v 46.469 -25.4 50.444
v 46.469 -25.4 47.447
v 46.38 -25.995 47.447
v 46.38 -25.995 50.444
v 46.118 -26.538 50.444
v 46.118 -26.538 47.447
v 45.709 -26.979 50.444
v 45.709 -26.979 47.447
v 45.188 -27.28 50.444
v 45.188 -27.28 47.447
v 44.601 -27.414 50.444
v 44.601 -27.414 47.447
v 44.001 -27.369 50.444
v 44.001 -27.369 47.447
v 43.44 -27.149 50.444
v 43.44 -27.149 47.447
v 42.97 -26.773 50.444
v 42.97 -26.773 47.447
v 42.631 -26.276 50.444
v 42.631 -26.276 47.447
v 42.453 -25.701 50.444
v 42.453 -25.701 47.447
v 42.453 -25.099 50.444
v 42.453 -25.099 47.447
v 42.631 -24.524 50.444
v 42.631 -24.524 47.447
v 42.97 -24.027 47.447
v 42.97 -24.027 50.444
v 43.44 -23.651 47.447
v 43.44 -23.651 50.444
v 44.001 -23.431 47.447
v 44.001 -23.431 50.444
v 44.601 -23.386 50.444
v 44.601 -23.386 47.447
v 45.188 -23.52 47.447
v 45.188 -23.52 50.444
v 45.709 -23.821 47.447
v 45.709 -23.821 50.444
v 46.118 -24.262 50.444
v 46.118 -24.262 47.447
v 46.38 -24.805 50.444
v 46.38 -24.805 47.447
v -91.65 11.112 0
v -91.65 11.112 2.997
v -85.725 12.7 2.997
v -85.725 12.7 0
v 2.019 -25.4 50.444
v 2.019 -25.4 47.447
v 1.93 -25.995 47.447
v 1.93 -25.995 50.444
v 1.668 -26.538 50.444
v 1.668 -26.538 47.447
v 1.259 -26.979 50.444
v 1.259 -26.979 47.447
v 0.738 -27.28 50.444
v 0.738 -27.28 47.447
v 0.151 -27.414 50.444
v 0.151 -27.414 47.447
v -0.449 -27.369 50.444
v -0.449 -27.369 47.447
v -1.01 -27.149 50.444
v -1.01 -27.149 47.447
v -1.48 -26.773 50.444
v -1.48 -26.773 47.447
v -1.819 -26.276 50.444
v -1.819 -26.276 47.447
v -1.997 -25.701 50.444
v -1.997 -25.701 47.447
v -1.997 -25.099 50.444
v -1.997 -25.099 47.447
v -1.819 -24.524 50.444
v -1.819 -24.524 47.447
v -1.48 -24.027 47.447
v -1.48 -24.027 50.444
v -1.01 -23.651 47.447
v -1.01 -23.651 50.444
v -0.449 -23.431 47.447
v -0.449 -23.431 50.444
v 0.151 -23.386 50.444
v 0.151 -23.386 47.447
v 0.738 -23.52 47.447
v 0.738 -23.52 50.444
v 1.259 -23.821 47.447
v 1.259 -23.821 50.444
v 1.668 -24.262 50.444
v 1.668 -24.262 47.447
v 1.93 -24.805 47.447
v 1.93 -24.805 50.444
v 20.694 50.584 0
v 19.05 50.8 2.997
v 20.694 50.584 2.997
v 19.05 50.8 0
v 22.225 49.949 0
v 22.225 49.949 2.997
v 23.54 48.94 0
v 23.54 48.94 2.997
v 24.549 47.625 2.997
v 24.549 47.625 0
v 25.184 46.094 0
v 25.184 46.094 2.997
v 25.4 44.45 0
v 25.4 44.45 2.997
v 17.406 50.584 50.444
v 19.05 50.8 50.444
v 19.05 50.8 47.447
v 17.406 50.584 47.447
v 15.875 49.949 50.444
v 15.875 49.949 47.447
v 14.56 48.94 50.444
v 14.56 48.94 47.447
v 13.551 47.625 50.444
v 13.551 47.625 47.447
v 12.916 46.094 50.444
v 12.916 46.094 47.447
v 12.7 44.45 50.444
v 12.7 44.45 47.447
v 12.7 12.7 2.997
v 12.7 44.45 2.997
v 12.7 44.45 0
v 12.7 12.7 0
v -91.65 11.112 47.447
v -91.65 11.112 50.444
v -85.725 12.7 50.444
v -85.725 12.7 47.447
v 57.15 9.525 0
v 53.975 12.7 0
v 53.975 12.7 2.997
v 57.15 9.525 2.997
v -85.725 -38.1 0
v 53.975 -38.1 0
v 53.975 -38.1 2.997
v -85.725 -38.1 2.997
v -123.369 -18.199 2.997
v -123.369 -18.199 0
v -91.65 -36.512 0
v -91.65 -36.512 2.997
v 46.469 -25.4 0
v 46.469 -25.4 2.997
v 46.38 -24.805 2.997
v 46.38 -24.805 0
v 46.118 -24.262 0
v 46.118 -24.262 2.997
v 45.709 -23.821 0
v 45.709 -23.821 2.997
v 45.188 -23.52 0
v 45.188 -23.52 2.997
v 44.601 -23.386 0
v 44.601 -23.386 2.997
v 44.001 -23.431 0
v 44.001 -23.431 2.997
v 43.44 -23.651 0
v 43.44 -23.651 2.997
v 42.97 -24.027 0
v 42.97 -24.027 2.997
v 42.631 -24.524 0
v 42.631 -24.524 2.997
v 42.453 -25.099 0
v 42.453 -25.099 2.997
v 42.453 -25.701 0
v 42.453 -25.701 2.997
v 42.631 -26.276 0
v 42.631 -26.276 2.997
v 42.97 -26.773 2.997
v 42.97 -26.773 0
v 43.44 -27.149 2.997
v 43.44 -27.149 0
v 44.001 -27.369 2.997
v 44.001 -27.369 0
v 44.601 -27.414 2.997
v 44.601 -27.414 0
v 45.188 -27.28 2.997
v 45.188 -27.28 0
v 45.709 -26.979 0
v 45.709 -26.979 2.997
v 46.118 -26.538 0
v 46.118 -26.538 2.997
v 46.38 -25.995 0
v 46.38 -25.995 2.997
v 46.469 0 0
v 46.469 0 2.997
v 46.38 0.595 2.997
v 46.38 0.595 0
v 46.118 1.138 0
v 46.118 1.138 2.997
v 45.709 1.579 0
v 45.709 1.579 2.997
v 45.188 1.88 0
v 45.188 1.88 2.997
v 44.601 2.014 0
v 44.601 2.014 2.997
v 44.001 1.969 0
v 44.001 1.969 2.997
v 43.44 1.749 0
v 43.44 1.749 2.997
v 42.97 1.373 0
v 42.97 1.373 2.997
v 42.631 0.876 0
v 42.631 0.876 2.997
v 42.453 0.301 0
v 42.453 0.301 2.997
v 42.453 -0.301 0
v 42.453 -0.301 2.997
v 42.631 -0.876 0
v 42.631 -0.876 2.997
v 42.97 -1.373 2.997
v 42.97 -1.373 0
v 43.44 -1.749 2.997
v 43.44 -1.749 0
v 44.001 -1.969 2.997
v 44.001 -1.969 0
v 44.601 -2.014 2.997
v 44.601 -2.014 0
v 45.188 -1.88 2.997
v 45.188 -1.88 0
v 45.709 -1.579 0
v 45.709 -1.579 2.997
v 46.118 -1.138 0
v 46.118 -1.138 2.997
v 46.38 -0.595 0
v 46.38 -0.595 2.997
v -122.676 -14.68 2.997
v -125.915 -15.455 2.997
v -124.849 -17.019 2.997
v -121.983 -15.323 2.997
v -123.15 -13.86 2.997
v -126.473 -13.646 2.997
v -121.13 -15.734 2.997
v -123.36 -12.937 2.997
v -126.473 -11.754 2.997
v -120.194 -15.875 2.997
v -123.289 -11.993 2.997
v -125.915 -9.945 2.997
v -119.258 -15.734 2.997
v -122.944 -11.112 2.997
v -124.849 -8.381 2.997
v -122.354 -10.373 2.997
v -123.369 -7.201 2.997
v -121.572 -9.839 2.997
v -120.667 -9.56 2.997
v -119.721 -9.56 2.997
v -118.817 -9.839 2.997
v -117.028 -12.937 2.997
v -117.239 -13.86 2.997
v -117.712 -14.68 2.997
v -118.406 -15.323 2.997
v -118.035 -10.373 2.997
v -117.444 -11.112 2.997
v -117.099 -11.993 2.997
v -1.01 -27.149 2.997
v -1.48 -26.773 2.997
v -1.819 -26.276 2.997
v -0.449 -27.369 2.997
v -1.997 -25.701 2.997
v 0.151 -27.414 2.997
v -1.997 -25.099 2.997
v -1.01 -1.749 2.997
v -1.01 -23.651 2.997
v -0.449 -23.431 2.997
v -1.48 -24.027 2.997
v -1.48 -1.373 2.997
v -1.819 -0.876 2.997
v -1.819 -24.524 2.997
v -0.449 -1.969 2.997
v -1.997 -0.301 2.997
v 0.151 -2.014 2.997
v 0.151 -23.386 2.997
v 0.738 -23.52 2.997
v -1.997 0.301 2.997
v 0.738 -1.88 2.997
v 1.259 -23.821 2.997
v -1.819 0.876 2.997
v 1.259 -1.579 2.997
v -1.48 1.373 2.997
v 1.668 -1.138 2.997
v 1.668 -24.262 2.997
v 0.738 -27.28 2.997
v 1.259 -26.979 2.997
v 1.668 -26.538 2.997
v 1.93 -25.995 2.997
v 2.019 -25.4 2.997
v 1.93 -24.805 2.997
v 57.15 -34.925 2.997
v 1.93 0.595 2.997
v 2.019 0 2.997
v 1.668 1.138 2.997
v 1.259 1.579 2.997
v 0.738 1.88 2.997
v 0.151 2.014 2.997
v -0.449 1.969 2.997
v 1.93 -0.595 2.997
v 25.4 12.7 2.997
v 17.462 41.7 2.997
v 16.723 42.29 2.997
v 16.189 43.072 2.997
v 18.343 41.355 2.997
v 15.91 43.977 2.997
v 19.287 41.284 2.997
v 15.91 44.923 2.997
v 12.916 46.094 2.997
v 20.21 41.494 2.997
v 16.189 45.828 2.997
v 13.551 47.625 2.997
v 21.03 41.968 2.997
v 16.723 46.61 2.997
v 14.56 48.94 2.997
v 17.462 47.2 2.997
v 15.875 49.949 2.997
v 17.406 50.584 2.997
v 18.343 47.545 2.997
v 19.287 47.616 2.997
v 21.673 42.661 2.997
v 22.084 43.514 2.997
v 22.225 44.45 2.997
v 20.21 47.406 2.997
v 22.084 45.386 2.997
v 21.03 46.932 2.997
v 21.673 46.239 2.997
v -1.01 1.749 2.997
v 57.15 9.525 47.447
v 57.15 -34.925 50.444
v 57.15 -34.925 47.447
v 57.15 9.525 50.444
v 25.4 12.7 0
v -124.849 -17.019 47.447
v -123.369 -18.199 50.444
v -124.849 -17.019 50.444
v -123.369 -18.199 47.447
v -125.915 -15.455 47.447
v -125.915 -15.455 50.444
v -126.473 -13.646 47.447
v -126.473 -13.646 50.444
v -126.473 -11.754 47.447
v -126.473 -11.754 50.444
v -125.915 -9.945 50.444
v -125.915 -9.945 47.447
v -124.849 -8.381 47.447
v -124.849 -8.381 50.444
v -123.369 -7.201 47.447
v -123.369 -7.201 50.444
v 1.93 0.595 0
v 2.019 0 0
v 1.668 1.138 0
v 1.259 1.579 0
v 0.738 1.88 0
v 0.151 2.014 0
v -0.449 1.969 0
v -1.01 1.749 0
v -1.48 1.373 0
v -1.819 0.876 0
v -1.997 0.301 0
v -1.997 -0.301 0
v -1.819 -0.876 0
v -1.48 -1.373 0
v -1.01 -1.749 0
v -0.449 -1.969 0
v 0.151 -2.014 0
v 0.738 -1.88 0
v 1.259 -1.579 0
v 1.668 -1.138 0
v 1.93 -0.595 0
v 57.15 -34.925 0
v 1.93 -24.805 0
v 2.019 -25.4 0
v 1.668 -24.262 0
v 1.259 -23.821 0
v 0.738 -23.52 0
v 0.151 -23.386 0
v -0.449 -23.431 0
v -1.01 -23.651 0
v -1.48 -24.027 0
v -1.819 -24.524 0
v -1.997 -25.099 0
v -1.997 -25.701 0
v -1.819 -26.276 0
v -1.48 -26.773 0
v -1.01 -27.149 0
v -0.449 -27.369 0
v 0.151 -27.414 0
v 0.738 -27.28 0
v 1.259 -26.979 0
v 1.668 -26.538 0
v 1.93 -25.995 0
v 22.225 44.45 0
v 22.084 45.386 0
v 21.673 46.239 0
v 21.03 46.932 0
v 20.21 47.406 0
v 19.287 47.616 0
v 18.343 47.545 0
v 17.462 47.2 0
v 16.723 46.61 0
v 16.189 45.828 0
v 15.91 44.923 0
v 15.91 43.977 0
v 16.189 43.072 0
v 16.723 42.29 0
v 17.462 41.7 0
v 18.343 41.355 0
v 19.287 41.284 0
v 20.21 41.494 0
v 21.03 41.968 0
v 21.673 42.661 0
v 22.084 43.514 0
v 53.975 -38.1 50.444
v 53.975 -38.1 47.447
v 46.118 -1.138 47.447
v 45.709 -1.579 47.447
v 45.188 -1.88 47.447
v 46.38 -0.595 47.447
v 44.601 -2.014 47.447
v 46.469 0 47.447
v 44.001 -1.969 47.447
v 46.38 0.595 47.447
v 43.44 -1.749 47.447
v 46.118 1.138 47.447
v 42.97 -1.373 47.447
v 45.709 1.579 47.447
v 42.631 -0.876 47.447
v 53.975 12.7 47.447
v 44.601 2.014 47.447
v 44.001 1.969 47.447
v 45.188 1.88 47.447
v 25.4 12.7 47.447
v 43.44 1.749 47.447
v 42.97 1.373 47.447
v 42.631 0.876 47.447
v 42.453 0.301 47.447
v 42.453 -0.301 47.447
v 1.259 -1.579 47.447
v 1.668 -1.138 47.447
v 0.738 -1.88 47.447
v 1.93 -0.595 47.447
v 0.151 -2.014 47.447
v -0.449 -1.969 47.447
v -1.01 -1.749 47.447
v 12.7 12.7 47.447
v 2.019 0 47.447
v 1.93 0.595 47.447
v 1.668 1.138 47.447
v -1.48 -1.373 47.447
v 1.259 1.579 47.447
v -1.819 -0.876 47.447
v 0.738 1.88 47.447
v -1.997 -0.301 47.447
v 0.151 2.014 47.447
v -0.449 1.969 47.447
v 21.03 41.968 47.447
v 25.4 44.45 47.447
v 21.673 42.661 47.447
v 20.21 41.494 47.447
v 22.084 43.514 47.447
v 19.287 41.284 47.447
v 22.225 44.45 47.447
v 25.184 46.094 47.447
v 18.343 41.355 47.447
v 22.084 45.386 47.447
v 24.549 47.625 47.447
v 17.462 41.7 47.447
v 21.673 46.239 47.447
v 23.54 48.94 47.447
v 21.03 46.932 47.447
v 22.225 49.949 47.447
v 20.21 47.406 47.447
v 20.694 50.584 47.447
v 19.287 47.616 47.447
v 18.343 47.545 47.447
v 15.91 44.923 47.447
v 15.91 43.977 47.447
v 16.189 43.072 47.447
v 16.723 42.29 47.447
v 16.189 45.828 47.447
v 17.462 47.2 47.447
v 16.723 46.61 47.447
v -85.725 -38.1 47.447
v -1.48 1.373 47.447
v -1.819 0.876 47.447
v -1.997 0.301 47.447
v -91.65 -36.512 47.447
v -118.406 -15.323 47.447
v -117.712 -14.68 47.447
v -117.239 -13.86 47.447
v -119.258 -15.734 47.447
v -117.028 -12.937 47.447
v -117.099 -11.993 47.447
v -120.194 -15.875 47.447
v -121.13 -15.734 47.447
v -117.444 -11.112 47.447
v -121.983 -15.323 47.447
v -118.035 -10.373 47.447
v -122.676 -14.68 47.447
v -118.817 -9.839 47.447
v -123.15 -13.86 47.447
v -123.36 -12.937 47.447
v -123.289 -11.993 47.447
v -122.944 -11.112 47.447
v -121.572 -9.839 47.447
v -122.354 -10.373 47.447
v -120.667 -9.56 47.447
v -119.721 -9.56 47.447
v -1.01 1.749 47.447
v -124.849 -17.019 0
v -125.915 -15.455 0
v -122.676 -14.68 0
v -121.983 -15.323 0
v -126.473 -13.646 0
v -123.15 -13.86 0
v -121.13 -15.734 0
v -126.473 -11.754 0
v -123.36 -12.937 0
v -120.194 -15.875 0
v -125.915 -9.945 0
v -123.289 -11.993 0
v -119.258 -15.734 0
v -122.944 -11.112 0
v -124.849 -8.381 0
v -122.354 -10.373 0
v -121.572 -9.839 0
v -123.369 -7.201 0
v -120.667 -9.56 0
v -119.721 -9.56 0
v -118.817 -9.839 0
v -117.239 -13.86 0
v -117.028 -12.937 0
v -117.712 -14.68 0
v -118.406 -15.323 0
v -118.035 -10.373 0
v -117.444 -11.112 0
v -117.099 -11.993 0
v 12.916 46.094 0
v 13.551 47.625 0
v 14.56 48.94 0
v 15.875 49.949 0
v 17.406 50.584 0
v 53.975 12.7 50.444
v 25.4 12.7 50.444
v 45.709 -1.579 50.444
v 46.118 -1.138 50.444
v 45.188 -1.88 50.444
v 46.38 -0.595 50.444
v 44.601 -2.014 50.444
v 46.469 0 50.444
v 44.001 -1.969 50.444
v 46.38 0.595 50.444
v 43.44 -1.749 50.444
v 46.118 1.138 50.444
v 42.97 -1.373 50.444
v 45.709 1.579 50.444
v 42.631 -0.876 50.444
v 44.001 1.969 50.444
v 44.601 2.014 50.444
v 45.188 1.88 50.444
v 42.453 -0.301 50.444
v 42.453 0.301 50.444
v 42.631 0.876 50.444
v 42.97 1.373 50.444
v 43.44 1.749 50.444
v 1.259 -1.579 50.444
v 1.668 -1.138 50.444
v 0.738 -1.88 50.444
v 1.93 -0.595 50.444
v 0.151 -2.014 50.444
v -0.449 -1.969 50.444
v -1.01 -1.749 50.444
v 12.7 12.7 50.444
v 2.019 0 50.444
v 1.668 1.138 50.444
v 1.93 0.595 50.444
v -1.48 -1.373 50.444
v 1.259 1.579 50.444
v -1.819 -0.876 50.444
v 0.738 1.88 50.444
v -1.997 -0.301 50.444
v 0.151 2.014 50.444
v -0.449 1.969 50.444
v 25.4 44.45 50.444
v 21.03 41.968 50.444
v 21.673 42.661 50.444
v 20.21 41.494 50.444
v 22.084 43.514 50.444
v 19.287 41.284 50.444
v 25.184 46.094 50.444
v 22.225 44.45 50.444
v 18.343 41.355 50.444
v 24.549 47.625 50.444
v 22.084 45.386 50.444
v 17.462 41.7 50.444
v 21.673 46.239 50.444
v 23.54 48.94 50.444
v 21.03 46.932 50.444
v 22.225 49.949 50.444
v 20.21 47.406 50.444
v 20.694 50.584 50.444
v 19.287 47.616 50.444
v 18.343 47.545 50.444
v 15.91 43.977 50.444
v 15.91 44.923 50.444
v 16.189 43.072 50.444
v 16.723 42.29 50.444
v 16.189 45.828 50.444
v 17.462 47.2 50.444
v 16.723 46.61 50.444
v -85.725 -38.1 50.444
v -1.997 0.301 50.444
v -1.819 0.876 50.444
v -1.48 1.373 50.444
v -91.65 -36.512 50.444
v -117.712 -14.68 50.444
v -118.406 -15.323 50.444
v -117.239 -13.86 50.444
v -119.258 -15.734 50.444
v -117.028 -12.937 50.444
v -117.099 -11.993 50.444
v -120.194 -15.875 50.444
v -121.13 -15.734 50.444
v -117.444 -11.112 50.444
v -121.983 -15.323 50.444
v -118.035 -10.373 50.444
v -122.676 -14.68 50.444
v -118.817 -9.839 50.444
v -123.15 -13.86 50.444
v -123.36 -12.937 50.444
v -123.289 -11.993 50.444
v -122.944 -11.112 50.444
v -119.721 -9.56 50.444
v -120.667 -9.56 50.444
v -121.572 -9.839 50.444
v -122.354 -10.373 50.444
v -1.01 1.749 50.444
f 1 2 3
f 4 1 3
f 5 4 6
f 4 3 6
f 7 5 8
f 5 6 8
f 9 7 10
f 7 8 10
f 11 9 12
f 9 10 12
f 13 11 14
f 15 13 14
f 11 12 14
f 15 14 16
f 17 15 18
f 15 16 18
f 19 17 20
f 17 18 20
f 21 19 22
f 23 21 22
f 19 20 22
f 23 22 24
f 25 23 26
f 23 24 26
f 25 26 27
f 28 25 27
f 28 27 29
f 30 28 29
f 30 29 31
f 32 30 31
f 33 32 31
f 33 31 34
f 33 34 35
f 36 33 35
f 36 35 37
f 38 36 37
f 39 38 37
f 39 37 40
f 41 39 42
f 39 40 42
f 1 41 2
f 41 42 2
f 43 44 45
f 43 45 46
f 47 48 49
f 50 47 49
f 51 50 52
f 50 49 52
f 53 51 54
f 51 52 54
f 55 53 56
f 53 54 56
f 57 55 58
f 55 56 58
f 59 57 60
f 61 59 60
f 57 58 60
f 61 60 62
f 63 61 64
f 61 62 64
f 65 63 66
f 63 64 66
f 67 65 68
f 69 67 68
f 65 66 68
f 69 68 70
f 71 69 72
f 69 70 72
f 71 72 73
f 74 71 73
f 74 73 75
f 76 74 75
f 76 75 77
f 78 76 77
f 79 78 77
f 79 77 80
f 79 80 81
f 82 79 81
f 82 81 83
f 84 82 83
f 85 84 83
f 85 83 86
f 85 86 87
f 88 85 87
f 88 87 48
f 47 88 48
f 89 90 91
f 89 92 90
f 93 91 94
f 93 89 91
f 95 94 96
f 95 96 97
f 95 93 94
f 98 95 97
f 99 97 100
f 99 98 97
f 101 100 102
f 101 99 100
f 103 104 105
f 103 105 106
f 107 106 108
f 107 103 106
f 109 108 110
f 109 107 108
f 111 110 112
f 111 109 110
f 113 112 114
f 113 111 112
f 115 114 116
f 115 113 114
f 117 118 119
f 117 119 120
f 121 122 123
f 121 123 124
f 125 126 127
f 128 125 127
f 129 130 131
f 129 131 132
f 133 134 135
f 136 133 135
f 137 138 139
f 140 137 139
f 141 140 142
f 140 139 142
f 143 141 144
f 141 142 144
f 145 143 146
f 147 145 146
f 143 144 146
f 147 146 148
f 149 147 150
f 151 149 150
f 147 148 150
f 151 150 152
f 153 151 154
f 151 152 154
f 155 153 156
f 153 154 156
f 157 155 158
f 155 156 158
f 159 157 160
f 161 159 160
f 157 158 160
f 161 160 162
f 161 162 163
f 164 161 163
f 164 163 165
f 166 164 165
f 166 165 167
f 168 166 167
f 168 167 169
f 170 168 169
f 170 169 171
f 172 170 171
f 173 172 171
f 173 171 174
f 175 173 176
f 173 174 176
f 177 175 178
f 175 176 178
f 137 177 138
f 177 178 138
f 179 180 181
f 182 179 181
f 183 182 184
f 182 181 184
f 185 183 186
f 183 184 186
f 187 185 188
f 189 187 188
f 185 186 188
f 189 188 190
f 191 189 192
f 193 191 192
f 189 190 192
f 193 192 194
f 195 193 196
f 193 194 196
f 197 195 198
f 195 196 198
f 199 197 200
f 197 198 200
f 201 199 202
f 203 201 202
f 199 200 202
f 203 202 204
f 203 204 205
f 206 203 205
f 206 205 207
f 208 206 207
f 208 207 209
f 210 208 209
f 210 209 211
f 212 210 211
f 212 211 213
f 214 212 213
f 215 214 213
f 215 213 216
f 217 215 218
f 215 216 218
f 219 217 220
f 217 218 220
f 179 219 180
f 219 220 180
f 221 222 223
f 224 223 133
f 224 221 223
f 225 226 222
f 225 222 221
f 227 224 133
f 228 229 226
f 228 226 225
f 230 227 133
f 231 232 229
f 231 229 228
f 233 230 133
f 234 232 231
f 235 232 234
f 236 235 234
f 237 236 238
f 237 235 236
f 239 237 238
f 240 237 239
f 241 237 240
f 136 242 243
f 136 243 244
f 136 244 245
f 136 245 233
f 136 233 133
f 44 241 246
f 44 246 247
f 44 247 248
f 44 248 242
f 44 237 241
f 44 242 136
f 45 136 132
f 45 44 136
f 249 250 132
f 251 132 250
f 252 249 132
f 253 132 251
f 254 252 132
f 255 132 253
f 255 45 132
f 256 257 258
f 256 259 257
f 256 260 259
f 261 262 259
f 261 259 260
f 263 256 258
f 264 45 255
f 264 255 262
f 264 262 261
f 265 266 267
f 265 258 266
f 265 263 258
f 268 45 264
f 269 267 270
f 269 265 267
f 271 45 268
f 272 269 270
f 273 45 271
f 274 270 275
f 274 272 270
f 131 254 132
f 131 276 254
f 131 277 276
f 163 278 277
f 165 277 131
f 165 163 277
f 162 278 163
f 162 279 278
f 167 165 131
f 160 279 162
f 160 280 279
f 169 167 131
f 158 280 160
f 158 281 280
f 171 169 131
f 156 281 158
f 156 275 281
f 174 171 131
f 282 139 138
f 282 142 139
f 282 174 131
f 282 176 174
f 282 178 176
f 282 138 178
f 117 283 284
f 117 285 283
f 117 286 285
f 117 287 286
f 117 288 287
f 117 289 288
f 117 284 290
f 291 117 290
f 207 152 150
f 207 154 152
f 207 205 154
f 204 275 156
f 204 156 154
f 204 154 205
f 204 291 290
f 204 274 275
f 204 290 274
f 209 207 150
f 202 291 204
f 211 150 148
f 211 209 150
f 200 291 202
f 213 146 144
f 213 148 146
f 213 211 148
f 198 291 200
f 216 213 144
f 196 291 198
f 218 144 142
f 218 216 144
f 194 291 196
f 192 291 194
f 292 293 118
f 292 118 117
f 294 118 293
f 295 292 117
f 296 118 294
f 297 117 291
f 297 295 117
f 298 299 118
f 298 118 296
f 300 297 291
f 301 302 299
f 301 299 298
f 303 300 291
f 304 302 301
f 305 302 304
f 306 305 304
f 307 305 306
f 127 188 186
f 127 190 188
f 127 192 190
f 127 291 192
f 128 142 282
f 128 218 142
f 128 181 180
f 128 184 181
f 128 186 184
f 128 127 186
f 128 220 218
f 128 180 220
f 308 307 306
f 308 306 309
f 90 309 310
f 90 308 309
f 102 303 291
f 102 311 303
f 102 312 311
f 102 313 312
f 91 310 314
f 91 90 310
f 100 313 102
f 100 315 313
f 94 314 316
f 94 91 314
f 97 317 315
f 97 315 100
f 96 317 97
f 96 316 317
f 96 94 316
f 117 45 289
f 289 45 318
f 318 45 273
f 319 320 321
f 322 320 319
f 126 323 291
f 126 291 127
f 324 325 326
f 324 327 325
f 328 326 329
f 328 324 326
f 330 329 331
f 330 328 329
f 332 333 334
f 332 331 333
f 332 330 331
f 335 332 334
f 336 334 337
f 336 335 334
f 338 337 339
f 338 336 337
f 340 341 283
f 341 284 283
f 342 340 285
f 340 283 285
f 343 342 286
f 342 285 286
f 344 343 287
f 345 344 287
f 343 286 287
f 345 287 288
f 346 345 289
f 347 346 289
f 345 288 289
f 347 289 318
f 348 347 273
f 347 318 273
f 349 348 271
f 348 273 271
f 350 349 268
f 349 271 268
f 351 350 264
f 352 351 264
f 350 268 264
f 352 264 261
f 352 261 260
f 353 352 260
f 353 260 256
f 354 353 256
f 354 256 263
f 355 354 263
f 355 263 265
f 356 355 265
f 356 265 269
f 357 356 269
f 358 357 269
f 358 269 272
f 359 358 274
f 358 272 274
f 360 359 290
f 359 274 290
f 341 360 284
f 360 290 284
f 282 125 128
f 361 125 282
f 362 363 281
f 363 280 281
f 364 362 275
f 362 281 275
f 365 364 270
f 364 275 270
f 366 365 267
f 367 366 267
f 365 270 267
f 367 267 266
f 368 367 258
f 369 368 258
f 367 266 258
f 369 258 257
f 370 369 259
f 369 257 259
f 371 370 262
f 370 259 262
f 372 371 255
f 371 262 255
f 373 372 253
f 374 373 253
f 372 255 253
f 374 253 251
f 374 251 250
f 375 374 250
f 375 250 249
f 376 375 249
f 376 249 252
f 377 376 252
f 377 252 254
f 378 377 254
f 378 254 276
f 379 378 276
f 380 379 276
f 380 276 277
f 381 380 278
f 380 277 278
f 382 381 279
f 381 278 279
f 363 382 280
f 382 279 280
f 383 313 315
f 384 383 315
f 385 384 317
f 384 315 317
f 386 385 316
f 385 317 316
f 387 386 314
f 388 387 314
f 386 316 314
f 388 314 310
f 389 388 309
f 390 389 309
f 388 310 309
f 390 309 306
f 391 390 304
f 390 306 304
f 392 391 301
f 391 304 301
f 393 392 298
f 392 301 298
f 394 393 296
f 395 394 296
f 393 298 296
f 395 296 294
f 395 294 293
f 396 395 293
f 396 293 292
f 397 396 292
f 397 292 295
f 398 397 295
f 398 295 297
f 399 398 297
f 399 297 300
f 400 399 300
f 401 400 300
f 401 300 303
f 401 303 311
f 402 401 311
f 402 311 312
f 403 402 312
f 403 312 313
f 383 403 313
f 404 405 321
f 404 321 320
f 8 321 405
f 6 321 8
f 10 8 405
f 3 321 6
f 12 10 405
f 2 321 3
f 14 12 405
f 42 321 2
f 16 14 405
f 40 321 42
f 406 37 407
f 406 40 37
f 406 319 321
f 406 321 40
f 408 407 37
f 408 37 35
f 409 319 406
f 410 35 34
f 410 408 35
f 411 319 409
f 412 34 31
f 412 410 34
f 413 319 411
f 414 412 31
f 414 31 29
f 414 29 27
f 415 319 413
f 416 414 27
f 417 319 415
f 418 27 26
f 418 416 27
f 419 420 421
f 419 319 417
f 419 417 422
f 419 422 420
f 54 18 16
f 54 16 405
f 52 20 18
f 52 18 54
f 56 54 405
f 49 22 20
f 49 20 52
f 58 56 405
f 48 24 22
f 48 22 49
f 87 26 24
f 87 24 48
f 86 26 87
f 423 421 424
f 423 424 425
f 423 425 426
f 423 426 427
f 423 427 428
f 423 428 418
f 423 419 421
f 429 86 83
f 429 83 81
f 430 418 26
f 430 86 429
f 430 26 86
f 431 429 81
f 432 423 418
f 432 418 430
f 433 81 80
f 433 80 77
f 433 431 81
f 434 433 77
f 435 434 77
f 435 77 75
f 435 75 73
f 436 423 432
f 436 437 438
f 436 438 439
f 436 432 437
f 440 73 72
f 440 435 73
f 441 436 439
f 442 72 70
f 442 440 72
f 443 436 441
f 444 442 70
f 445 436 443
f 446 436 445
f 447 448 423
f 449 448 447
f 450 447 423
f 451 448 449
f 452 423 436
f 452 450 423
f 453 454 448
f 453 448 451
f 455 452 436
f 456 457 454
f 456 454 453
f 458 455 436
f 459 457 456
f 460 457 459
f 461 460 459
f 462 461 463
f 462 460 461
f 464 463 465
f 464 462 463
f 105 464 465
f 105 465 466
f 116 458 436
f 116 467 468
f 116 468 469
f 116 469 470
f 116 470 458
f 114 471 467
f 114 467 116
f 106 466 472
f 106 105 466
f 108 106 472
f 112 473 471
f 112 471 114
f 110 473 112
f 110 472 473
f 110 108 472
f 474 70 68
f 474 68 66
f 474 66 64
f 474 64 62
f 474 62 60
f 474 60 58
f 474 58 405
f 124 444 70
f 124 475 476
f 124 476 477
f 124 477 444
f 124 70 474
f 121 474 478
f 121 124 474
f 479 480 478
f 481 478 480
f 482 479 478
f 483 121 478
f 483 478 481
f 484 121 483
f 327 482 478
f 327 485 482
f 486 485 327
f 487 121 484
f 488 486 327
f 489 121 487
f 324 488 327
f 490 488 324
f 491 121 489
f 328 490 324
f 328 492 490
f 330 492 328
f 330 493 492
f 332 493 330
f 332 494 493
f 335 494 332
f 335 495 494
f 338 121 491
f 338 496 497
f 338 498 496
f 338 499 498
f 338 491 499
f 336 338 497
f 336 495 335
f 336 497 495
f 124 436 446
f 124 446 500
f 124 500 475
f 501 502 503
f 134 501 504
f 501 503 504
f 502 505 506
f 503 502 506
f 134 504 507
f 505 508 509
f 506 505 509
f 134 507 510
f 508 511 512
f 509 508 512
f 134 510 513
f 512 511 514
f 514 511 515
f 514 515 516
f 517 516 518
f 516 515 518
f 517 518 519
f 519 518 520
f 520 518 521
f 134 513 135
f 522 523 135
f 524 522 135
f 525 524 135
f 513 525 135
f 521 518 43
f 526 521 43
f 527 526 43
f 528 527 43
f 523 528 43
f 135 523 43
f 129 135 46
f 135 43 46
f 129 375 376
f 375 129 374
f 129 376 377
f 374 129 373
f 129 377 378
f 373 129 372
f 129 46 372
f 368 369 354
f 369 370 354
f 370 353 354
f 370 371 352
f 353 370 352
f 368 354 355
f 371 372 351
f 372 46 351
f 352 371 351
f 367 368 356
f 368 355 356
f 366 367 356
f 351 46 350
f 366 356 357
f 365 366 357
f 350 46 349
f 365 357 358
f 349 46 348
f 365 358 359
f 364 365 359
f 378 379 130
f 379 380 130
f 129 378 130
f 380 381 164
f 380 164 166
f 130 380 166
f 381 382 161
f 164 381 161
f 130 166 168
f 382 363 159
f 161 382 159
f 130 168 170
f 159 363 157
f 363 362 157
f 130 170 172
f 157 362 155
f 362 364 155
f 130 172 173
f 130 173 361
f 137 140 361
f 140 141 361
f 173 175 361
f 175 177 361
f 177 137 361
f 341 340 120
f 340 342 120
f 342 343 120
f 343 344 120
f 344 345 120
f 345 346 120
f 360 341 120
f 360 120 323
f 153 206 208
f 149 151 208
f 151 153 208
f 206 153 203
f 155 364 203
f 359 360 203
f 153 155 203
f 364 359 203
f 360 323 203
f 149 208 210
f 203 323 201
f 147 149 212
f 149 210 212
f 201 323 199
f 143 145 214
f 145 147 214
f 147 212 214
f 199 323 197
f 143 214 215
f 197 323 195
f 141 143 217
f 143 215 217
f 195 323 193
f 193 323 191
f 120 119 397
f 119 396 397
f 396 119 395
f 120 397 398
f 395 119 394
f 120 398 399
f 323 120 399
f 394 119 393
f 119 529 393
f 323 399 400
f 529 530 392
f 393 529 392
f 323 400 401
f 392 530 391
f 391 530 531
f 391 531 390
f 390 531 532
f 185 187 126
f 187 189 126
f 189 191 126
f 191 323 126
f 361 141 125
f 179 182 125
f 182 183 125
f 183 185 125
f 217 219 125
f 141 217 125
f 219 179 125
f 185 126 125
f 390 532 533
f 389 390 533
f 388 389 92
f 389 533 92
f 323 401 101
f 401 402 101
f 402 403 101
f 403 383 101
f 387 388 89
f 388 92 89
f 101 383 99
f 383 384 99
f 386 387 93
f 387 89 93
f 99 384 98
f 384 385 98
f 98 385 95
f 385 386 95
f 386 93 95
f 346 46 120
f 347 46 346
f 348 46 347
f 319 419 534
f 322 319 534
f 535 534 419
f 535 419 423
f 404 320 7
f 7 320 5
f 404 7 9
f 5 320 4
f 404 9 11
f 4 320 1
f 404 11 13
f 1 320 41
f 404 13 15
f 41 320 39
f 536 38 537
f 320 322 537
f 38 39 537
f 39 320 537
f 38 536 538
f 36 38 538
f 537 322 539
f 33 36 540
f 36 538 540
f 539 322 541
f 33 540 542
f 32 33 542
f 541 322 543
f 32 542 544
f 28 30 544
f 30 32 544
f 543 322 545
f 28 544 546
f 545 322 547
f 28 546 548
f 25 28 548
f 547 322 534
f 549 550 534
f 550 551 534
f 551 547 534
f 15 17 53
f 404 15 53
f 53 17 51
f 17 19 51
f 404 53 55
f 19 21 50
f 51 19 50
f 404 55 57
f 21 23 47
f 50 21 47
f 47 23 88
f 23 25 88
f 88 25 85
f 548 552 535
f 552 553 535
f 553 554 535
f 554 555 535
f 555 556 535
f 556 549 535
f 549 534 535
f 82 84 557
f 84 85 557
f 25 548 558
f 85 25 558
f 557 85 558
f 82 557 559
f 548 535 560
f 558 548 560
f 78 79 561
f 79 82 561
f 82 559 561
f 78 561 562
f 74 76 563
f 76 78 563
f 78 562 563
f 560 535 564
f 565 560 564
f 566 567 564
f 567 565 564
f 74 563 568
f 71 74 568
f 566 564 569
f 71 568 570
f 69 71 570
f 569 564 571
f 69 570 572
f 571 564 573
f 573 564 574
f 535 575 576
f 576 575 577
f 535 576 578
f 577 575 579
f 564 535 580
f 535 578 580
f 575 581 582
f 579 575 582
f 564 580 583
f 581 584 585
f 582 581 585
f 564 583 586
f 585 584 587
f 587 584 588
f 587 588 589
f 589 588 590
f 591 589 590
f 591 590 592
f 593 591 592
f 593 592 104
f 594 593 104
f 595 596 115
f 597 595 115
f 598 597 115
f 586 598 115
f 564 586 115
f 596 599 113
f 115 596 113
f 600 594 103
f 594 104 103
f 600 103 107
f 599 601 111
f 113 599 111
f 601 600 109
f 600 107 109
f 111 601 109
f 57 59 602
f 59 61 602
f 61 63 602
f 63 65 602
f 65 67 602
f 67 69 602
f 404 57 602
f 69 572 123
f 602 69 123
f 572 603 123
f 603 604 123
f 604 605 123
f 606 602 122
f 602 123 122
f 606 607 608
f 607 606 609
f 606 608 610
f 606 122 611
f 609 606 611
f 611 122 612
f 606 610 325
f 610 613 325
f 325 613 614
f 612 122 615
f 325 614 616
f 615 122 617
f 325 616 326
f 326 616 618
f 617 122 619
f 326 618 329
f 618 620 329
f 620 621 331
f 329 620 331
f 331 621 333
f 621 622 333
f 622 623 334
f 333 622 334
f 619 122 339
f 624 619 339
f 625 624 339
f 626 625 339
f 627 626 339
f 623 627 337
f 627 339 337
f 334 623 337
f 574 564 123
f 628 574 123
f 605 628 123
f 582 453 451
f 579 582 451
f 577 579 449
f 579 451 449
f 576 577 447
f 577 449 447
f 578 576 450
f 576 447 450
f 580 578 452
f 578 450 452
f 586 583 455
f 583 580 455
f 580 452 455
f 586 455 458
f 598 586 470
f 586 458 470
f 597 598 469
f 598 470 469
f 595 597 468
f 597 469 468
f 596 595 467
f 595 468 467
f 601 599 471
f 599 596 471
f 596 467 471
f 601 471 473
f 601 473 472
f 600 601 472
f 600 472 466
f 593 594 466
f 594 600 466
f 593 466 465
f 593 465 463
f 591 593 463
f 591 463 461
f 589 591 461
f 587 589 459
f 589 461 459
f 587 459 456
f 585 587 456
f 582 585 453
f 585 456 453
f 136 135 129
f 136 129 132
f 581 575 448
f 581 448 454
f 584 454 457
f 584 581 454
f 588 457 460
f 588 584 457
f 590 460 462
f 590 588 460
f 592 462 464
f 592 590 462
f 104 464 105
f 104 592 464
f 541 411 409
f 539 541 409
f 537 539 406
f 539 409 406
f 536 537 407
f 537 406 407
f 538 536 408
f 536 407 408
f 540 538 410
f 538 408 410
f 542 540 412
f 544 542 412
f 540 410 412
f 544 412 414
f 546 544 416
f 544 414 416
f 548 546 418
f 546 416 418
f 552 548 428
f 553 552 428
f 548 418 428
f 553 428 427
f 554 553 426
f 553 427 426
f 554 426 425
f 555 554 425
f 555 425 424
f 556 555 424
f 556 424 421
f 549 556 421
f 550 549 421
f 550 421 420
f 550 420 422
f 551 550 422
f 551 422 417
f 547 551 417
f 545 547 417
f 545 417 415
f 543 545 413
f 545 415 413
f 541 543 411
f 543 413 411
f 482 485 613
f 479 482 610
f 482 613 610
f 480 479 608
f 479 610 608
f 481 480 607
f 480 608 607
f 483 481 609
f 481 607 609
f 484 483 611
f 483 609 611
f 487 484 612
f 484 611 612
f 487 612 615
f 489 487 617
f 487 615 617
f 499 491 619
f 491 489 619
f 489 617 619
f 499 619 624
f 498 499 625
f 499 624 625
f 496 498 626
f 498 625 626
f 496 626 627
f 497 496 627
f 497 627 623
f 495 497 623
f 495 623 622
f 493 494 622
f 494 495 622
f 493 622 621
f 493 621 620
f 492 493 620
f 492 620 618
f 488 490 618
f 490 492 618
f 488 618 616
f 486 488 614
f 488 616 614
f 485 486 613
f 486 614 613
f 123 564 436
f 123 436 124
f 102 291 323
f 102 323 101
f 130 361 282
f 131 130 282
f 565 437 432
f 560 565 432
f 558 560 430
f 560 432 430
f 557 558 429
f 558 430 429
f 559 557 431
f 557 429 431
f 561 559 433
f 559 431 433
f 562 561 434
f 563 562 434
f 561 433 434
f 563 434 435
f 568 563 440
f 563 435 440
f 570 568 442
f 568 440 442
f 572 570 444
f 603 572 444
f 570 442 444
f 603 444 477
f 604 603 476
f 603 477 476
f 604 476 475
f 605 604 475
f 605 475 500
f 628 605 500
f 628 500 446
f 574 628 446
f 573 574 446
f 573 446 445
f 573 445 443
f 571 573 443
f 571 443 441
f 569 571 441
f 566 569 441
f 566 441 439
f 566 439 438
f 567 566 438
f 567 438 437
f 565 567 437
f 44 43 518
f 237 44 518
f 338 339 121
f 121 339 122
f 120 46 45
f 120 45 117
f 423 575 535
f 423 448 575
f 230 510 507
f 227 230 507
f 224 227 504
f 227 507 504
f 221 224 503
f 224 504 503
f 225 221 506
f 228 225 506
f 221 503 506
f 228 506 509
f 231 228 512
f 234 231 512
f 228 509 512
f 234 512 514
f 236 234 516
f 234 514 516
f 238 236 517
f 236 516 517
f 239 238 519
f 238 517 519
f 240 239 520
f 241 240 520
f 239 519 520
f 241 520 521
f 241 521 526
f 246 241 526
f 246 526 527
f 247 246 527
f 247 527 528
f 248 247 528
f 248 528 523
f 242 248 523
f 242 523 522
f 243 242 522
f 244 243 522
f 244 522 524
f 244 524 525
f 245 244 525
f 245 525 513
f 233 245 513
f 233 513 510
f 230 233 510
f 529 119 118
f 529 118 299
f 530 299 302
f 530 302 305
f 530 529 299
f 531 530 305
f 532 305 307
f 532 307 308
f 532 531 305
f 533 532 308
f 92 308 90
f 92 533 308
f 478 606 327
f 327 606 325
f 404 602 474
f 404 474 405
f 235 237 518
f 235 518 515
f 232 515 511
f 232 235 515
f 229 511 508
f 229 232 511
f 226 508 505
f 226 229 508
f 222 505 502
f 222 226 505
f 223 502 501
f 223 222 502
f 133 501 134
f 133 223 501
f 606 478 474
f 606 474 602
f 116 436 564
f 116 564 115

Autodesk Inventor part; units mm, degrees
ref_plane "YZ Plane" through (0, 0, 0) normal (1, 0, 0) x (0, 1, 0)
ref_plane "XZ Plane" through (0, 0, 0) normal (0, 1, 0) x (-1, 0, 0)
sketch "Sketch1" plane through (0, 0, 0) normal (0, 0, 1) x (1, 0, 0)
  line L0 (0, 0) -> (44.45, 0) construction
  line L1 (44.45, 0) -> (44.45, -25.4) construction
  line L2 (44.45, -25.4) -> (0, -25.4) construction
  line L3 (0, -25.4) -> (0, 0) construction
  line L4 (-88.9, 12.7) -> (57.15, 12.7)
  line L5 (57.15, 12.7) -> (57.15, -38.1)
  line L6 (57.15, -38.1) -> (-88.9, -38.1)
  line L7 (-88.9, 12.7) -> (-132.8941, -12.7)
  line L8 (-132.8941, -12.7) -> (-88.9, -38.1)
  line L9 (-88.9, 12.7) -> (-88.9, -38.1) construction
  dimension "d0" = 44.45
  dimension "d1" = 25.4
  dimension "d2" = 12.7
  dimension "d3" = 12.7
  dimension "d5" = 12.7
  dimension "d37" = 146.05
  dimension "d38" = 50.8
extrude "Extrusion1" add sketch "Sketch1" along normal blind 2.9972
sketch "Sketch2" plane through (0, 0, 2.9972) normal (0, 0, 1) x (1, 0, 0)
  line L0 (0, -25.4) -> (44.45, -25.4) construction
  line L1 (44.45, -25.4) -> (44.45, 0) construction
  line L2 (44.45, 0) -> (0, 0) construction
  line L3 (0, 0) -> (0, -25.4) construction
  line L4 (-88.9, -38.1) -> (57.15, -38.1) projected
  line L5 (57.15, -38.1) -> (57.15, 12.7) projected
  circle A0 centre (0, 0) radius 2.0193
  circle A1 centre (44.45, 0) radius 2.0193
  circle A2 centre (44.45, -25.4) radius 2.0193
  circle A3 centre (0, -25.4) radius 2.0193
  point P0 (0, 0)
  dimension "d8" = 12.7
  dimension "d9" = 25.4
  dimension "d10" = 12.7
  dimension "d11" = 44.45
  dimension "d12" = 4.0386
extrude "Extrusion2" cut sketch "Sketch2" against normal through all
fillet "Fillet1" radius 6.35 1 edges at (-132.8941, -12.7, 1.4986)
chamfer "Chamfer1" distance 3.175 angle 45 4 edges at (57.15, 12.7, 1.4986) (57.15, -38.1, 1.4986) (-88.9, 12.7, 1.4986) (-88.9, -38.1, 1.4986)
sketch "Sketch3" plane through (0, 0, 2.9972) normal (0, 0, 1) x (1, 0, 0)
  arc A0 (-123.3691, -7.2007) -> (-123.3691, -18.1993) centre (-120.1941, -12.7) ccw projected
  circle A1 centre (-120.1941, -12.7) radius 3.175
  point P0 (0, 0)
  dimension "d19" = 6.35
hole "Hole1" at (-120.1941, -12.7, 2.9972) direction (0, 0, -1) diameter 6.35 end through all
sketch "Sketch4" plane through (0, 0, 2.9972) normal (0, 0, 1) x (1, 0, 0)
  circle A0 centre (19.05, 44.45) radius 3.175
  line L0 (53.975, 12.7) -> (-85.725, 12.7) projected
  line L1 (12.7, 12.7) -> (25.4, 12.7)
  line L2 (25.4, 12.7) -> (25.4, 50.8)
  line L3 (25.4, 50.8) -> (12.7, 50.8)
  line L4 (12.7, 50.8) -> (12.7, 12.7)
  line L5 (57.15, -34.925) -> (57.15, 9.525) projected
  point P0 (0, 0)
  dimension "d27" = 6.35
  dimension "d28" = 6.35
  dimension "d29" = 12.7
  dimension "d30" = 6.35
  dimension "d31" = 31.75
  dimension "d32" = 38.1
extrude "Extrusion3" add sketch "Sketch4" against normal blind 2.9972
fillet "Fillet2" radius 6.35 2 edges at (12.7, 50.8, 1.4986) (25.4, 50.8, 1.4986)
ref_plane "Work Plane1" through (0, 0, 25.2222) normal (0, 0, 1) x (1, 0, 0)
mirror "Mirror1" about plane through (0, 0, 25.2222) normal (0, 0, 1) of "Extrusion1", "Extrusion2", "Fillet1", "Chamfer1", "Hole1", "Extrusion3", "Fillet2"
properties part number "Papa John Mounting Plate" material "Polycarbonate, Clear"
